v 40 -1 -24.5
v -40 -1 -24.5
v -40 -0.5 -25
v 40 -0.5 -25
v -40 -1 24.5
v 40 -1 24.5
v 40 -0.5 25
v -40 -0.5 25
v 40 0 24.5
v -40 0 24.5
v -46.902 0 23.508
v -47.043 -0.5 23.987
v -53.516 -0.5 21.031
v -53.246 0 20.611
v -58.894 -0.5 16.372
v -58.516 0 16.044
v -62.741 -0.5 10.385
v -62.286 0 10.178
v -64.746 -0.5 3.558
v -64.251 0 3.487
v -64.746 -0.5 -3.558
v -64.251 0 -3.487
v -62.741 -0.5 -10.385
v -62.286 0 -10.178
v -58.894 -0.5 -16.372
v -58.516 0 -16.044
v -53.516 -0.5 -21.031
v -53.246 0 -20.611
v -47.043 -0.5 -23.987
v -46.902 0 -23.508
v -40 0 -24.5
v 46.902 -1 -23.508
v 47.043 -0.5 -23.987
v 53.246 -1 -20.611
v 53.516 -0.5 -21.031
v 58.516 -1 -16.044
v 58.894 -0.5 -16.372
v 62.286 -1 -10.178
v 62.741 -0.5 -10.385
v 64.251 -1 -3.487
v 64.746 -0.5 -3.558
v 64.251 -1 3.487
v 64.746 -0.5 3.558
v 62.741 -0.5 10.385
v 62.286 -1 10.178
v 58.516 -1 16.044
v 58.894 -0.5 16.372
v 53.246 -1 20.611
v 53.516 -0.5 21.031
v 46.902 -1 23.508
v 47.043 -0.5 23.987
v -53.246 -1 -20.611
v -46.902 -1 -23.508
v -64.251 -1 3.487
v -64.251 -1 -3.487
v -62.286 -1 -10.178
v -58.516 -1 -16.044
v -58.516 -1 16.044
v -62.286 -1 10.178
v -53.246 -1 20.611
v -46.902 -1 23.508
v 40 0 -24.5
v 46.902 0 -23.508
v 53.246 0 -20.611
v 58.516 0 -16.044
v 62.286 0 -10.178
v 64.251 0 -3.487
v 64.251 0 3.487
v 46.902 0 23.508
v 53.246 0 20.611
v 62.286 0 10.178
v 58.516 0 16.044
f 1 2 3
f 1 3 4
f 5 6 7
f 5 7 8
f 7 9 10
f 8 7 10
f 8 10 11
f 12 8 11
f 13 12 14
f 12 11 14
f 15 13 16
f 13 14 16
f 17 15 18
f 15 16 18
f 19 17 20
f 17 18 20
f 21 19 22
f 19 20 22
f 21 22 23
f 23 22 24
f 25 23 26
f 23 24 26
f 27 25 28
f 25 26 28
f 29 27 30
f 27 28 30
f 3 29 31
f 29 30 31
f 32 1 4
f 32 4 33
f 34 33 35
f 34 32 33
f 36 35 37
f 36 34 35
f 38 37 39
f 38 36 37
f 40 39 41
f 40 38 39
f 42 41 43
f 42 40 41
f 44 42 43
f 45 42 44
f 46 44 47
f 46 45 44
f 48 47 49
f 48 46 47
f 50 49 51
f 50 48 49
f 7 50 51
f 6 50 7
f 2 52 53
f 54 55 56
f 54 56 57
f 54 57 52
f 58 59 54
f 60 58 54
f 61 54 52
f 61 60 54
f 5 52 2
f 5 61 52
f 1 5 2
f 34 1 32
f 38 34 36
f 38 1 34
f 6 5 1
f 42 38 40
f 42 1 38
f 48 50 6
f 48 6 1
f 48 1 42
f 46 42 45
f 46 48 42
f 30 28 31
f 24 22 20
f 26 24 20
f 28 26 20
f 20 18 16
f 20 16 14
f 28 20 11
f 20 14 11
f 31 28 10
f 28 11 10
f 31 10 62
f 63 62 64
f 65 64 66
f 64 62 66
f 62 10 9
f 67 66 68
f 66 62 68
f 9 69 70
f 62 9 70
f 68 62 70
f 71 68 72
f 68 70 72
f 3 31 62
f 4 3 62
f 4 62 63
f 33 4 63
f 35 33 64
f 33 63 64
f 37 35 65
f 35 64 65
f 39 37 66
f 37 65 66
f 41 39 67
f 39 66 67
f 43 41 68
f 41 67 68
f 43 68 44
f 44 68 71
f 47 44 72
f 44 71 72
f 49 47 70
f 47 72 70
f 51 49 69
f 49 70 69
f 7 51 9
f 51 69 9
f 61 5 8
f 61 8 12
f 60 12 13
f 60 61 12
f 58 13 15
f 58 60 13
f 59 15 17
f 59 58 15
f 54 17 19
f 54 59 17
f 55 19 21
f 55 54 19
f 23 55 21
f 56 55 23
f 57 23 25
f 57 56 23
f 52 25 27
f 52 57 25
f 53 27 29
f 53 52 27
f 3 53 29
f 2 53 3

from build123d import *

# Parameters (mm, degrees)
F1_DEPTH = 1
F2_SIZE  = 0.49999


# Not quite as in the source:
# - a fillet or chamfer is up to 0.001 mm smaller than in the source, because OpenCascade refuses the exact size


with BuildPart() as f1:
    # F0 (on Front) → F1 (new body)
    with BuildSketch(Plane.XZ):
        with BuildLine():
            ThreePointArc((40, -25), (65, 0), (40, 25))
            Line((40, 25), (-40, 25))
            ThreePointArc((-40, 25), (-65, 0), (-40, -25))
            Line((-40, -25), (40, -25))
        make_face()
    extrude(amount=F1_DEPTH)

    # F2 (size 0.5 in the source; OpenCascade refuses exactly that, so slightly less here)
    f2_edges = [f1.edges().sort_by_distance(p)[0] for p in [
        (0, -1, 25),
        (0, 0, 25),
    ]]
    chamfer(f2_edges, length=F2_SIZE)


solid = f1.part
